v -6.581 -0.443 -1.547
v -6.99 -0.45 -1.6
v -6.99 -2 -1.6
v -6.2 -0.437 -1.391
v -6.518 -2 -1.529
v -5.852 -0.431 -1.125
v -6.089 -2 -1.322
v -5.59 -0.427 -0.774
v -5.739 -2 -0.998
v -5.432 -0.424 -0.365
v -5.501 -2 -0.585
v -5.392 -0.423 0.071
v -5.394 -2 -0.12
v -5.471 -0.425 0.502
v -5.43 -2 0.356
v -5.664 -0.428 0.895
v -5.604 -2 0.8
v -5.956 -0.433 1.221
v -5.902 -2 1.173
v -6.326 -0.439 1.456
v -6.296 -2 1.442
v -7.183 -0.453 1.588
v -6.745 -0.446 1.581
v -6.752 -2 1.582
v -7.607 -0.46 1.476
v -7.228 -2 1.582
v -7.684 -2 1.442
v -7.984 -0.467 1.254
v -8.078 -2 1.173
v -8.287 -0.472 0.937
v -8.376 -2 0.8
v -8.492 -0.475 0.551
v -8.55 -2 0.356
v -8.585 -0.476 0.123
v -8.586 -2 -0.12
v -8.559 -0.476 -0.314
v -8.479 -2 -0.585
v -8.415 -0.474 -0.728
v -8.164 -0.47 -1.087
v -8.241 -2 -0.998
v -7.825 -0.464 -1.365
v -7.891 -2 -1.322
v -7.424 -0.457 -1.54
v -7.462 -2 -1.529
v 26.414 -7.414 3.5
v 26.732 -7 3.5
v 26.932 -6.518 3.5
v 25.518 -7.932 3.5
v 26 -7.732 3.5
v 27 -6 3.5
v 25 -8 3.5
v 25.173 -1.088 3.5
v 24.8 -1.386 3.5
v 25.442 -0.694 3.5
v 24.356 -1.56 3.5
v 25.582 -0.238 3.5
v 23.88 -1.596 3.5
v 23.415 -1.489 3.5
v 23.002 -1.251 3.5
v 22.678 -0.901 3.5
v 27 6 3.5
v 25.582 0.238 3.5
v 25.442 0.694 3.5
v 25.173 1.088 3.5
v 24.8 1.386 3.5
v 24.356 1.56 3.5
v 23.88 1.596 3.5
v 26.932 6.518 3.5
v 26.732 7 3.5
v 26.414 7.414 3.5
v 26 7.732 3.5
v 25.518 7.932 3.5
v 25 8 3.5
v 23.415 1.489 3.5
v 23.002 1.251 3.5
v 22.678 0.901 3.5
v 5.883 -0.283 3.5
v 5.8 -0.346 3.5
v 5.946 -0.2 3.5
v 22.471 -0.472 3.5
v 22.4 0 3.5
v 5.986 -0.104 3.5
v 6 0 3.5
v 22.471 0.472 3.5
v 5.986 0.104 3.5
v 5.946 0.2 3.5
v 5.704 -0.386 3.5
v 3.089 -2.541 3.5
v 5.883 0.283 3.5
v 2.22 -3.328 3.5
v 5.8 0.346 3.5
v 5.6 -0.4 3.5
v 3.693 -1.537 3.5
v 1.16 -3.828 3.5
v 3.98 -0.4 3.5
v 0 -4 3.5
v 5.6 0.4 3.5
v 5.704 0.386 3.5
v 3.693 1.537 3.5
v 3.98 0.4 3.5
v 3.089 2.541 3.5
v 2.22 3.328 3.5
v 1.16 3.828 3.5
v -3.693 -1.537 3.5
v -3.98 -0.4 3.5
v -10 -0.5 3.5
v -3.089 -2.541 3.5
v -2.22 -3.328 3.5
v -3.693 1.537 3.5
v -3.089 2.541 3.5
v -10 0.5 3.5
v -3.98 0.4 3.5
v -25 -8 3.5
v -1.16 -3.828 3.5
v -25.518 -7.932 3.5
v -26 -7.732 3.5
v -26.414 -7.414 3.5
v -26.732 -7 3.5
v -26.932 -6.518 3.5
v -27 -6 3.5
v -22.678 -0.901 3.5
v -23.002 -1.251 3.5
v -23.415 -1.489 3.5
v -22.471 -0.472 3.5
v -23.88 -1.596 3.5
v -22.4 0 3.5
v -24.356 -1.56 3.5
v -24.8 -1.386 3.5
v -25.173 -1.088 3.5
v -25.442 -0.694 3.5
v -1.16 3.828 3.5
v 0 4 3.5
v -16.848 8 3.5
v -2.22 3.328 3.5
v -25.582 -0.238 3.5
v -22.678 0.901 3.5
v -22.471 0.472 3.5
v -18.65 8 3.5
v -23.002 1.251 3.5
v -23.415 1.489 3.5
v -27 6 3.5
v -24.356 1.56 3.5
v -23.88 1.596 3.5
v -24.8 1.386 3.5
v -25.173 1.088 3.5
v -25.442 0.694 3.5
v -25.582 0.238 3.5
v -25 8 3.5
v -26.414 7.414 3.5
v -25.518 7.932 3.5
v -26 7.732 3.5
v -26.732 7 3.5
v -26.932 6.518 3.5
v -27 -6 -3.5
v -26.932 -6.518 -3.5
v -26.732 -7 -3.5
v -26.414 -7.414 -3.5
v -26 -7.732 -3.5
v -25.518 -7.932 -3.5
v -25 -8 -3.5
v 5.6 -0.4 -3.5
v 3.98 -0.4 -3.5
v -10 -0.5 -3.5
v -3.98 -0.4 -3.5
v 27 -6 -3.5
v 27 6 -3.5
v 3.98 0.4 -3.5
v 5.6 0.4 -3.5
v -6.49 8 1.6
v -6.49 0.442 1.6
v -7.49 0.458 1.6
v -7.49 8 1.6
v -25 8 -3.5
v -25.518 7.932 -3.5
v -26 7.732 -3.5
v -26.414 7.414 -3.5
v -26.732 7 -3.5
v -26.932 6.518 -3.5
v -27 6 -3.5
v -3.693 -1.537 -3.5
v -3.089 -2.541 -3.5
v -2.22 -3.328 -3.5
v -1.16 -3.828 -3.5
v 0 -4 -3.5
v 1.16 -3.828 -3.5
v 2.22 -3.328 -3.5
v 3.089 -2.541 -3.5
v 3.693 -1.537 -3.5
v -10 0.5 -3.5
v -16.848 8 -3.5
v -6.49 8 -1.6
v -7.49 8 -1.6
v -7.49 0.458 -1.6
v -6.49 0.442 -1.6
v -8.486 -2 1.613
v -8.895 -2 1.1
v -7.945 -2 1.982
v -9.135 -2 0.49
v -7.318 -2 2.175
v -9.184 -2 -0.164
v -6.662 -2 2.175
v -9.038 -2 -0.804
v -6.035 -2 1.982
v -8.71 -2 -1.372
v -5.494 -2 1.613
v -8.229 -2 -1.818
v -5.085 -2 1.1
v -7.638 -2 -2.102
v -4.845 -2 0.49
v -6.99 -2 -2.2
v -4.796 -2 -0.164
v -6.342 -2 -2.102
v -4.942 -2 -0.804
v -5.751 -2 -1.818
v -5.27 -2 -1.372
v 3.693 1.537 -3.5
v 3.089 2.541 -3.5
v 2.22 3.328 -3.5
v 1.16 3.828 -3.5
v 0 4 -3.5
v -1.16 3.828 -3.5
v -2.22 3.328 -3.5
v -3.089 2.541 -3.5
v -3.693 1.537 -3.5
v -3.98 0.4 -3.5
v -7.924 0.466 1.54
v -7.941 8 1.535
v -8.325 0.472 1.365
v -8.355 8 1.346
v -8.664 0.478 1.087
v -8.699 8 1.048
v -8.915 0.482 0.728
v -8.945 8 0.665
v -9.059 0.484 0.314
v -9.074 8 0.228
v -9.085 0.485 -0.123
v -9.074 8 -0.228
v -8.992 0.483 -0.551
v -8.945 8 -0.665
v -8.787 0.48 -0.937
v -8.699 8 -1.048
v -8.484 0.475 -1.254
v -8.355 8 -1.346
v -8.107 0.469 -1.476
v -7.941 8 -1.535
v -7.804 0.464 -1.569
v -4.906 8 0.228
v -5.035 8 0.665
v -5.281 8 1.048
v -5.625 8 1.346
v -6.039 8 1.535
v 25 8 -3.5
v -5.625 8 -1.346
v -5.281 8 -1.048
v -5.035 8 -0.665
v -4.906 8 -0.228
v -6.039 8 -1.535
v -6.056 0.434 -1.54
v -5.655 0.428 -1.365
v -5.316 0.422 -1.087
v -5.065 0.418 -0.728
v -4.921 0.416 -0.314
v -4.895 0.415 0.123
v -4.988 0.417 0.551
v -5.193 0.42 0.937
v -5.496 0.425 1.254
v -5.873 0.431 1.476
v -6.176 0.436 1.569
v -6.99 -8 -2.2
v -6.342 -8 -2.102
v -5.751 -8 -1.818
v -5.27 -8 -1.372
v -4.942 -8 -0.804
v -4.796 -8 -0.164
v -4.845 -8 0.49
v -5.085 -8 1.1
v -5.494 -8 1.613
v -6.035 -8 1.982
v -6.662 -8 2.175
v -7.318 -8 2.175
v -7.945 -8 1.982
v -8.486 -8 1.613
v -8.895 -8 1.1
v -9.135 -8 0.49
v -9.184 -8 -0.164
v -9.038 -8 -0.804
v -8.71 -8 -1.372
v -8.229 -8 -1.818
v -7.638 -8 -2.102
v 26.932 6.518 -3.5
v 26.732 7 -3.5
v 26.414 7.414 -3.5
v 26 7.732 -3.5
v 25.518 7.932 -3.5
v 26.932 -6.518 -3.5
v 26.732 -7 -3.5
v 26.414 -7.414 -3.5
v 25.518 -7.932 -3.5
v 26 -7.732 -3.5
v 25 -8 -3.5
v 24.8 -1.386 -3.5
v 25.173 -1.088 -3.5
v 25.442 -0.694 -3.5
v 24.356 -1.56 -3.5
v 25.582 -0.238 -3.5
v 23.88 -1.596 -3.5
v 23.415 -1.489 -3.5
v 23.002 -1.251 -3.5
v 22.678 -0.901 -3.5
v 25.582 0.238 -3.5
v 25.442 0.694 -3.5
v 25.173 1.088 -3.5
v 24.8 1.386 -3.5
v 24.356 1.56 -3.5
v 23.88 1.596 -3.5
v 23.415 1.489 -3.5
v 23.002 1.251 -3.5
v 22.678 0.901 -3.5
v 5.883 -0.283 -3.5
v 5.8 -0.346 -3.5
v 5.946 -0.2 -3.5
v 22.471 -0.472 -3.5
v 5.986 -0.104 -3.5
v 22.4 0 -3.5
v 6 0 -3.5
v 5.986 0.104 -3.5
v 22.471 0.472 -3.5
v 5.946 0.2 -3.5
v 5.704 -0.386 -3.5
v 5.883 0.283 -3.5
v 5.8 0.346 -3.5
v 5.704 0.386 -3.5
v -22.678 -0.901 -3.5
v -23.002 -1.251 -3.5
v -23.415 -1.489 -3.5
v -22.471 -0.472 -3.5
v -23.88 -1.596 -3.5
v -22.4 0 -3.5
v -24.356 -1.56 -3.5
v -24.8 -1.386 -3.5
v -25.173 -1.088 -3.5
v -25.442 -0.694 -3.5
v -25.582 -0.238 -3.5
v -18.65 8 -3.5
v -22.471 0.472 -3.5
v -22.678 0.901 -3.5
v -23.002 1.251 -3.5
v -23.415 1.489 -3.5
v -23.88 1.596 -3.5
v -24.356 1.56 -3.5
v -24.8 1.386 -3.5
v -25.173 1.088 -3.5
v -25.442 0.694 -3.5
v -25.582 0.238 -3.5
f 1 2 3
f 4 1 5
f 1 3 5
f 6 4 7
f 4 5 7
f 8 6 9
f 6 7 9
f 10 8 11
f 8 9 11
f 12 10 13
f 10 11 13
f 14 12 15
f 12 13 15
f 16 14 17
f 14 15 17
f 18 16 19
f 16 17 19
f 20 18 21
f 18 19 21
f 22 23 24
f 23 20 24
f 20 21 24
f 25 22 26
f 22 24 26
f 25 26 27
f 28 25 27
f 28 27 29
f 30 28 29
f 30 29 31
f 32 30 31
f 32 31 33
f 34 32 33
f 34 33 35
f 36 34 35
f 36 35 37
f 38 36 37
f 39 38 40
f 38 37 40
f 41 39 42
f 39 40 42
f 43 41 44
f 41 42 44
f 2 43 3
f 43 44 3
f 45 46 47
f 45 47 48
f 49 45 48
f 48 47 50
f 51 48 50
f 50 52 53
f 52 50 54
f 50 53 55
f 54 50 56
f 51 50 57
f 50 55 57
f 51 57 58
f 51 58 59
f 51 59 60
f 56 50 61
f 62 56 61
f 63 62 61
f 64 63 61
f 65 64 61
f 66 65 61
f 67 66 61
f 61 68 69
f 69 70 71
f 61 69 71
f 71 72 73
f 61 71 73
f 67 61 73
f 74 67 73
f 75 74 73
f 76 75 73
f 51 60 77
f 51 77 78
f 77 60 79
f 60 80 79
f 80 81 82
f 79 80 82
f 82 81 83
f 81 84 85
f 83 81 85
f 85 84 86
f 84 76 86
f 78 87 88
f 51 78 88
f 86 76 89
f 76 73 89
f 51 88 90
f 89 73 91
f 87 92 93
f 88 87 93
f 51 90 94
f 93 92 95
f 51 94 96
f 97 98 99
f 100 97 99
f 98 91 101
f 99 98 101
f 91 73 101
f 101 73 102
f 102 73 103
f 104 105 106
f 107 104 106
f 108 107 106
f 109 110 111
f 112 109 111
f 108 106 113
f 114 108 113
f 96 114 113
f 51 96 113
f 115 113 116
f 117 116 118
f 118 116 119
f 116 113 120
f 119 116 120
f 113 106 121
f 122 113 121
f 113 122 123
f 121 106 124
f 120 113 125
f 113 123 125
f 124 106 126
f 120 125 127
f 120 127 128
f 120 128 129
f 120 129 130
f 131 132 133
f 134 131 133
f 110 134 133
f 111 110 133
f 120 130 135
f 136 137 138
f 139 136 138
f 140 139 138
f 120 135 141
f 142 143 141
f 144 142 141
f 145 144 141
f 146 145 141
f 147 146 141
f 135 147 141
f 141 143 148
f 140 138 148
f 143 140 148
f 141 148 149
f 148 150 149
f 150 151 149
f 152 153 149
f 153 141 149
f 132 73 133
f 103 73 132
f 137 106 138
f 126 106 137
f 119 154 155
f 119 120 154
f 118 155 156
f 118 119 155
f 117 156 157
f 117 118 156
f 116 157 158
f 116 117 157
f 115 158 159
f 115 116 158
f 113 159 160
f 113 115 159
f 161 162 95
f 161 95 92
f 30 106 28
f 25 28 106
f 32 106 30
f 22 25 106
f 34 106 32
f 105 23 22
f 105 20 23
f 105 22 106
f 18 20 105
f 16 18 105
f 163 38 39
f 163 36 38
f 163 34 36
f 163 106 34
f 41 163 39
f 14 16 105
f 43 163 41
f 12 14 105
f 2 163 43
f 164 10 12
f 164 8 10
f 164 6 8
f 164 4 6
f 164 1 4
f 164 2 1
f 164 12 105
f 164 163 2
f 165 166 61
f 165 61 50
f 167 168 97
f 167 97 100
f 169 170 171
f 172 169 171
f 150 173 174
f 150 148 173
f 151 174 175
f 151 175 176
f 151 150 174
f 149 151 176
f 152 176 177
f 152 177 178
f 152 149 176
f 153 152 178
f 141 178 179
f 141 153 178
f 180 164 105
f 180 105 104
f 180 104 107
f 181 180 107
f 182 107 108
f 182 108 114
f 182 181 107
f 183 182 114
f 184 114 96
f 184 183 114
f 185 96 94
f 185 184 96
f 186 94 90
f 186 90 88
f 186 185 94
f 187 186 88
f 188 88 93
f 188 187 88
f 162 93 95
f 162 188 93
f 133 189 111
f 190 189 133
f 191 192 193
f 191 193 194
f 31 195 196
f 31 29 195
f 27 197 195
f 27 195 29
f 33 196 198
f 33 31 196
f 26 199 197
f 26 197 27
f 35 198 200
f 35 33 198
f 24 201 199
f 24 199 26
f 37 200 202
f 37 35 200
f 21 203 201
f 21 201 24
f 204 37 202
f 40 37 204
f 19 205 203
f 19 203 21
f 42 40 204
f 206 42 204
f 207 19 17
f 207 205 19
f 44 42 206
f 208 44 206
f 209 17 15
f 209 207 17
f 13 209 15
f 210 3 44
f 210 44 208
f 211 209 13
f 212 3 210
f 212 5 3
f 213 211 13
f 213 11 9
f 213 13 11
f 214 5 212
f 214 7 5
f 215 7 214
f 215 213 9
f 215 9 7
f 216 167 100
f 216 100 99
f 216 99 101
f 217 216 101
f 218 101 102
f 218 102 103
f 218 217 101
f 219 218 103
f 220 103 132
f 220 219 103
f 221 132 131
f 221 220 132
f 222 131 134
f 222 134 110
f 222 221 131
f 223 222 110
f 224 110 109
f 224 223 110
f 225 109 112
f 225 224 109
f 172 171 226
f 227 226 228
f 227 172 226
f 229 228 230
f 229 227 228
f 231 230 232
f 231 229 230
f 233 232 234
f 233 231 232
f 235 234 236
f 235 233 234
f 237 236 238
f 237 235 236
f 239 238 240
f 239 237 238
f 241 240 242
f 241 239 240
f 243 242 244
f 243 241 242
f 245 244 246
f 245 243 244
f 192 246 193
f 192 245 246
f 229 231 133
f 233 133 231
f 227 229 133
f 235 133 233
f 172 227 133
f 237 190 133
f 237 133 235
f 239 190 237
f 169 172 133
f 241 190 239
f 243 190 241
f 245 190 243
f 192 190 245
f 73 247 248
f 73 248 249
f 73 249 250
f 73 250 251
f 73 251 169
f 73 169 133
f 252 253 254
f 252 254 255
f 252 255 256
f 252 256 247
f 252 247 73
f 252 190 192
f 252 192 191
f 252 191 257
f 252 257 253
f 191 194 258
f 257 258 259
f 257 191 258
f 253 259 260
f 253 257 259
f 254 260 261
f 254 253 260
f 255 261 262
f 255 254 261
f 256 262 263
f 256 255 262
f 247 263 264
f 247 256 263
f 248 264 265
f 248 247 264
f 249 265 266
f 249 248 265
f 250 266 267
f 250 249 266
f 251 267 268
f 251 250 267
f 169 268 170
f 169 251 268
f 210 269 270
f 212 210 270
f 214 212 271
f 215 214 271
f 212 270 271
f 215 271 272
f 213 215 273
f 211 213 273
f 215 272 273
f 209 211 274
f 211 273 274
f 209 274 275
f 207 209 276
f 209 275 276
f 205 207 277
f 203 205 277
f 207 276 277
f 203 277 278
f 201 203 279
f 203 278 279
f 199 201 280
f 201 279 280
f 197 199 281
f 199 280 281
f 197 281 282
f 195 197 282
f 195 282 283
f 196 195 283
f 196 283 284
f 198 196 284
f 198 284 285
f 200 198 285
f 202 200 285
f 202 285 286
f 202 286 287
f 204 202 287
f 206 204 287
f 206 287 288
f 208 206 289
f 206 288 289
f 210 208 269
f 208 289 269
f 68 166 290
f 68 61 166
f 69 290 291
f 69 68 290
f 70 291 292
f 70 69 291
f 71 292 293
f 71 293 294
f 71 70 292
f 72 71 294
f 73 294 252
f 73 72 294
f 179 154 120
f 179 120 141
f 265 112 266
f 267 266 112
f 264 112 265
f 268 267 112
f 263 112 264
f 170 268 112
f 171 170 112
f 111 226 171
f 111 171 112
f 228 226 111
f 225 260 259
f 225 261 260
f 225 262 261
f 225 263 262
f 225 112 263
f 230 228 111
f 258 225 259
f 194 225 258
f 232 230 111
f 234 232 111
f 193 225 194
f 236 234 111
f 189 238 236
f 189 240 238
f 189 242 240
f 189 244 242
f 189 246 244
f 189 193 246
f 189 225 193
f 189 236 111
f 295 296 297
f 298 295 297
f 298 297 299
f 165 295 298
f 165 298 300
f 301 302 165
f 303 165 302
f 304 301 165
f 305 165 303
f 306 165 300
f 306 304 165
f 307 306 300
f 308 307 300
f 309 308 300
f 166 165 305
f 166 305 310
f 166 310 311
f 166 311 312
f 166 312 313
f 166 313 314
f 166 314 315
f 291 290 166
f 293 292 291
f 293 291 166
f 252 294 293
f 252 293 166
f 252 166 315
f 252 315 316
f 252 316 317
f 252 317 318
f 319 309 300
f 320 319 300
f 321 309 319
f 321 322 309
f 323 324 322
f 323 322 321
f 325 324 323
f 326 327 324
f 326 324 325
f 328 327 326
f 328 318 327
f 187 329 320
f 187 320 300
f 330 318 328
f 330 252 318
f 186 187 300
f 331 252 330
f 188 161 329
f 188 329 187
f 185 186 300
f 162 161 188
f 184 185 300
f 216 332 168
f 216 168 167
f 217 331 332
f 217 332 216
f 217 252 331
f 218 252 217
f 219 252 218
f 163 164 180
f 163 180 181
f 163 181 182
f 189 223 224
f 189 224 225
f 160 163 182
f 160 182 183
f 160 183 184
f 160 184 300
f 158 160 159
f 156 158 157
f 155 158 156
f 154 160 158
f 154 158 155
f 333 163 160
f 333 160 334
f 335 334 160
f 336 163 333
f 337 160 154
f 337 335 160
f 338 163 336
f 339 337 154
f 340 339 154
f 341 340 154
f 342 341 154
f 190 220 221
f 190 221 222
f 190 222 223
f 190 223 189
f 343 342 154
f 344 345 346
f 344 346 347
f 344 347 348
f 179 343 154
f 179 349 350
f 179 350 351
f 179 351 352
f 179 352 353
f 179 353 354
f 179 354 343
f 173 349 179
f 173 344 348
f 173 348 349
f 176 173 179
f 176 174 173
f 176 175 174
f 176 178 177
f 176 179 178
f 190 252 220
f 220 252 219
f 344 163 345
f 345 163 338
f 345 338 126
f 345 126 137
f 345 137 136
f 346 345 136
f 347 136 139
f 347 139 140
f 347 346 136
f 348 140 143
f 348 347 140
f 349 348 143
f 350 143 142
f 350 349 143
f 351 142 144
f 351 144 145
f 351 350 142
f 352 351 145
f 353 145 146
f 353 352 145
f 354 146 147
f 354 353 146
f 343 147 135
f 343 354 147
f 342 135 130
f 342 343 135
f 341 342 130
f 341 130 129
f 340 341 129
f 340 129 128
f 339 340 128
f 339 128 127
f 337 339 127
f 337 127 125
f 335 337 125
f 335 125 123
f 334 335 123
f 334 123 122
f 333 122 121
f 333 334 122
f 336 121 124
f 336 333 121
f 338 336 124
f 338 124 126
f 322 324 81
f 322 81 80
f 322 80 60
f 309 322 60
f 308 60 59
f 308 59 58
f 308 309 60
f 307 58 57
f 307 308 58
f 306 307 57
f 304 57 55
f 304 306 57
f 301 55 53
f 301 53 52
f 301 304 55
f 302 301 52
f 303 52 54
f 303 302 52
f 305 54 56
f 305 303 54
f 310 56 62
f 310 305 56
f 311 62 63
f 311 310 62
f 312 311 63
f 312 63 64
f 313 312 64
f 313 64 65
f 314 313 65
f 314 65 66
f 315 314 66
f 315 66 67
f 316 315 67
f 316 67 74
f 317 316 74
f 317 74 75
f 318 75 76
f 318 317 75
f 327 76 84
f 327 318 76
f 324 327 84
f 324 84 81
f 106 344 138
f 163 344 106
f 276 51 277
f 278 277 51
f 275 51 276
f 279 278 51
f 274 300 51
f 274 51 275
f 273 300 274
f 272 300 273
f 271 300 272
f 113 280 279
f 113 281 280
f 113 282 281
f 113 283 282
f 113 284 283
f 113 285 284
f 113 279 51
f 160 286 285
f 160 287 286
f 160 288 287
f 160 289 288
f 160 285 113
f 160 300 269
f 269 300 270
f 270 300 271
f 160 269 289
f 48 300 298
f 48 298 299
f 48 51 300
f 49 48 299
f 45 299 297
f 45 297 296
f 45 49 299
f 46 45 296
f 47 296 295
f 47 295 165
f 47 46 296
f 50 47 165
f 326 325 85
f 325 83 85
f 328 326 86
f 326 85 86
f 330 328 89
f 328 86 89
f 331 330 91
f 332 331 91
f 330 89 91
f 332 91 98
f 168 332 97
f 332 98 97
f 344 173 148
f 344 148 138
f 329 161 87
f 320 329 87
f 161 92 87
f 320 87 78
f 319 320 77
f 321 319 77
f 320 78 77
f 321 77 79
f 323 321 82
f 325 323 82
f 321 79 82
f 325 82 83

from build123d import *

# Parameters (mm, degrees)
BOSS_EXTRUDE1_DEPTH      = 3.5
BOSS_EXTRUDE1_DEPTH_BACK = 3.5
SKETCH1_R                = 1.6
CUT_EXTRUDE1_REACH       = 33.579
SKETCH3_R                = 1.6
SKETCH3_3_R              = 2.2
SKETCH3_3_R_2            = 1.6
CUT_EXTRUDE2_DEPTH       = 6
CUT_EXTRUDE3_REACH       = 33.579
FILLET1_R                = 2
FILLET2_R                = 0.4


with BuildPart() as part:
    # Sketch1 → Boss-Extrude1 (new, two sides: drawn at the far end of the back side and taken through both)
    with BuildSketch(Plane.XY.offset(-BOSS_EXTRUDE1_DEPTH_BACK)):
        with BuildLine():
            Line((-27, 8), (-18.64966284, 8))
            Line((-18.64966284, 8), (-10, -0.5))
            Line((-10, -0.5), (-3.979949748, -0.4))
            ThreePointArc((-3.979949748, -0.4), (0, -4), (3.979949748, -0.4))
            Line((3.979949748, -0.4), (6, -0.4))
            Line((6, -0.4), (6, 0.4))
            Line((6, 0.4), (3.979949748, 0.4))
            ThreePointArc((3.979949748, 0.4), (0, 4), (-3.979949748, 0.4))
            Line((-3.979949748, 0.4), (-10, 0.5))
            Line((-10, 0.5), (-16.848441102, 8))
            Line((-16.848441102, 8), (27, 8))
            Line((27, 8), (27, -8))
            Line((27, -8), (-27, -8))
            Line((-27, -8), (-27, 8))
        make_face()
        with Locations((-24, 0)):
            Circle(SKETCH1_R, mode=Mode.SUBTRACT)
        with Locations(Location((24, 0, 0), (0, 0, 180))):
            Circle(SKETCH1_R, mode=Mode.SUBTRACT)
    extrude(amount=BOSS_EXTRUDE1_DEPTH + BOSS_EXTRUDE1_DEPTH_BACK)

    # Cut-Extrude1: up to this plane
    cut_extrude1_end = Plane(origin=(-10, -0.5, -3.5), z_dir=(-0.016608865731892127, 0.9998620632762801, 0))
    # Sketch3 → Cut-Extrude1 (cut, up to the surface)
    with BuildSketch(Plane.XZ.offset(8), mode=Mode.PRIVATE) as cut_extrude1_sk1:
        with Locations(Location((-6.989974874, 0, 0), (0, 0, 270))):
            Circle(SKETCH3_R)
    cut_extrude1_tool1 = split(extrude(cut_extrude1_sk1.sketch, amount=-CUT_EXTRUDE1_REACH, mode=Mode.PRIVATE), bisect_by=cut_extrude1_end, keep=Keep.BOTH, mode=Mode.PRIVATE)
    add(cut_extrude1_tool1.solids().sort_by_distance((-6.989975, -8, 0))[0], mode=Mode.SUBTRACT)

    # Sketch3<3> → Cut-Extrude2 (cut)
    with BuildSketch(Plane.XZ.offset(8)):
        with Locations(Location((-6.989974874, 0, 0), (0, 0, 270))):
            Circle(SKETCH3_3_R)
        with Locations(Location((-6.989974874, 0, 0), (0, 0, 270))):
            Circle(SKETCH3_3_R_2, mode=Mode.SUBTRACT)
    extrude(amount=-CUT_EXTRUDE2_DEPTH, mode=Mode.SUBTRACT)

    # Cut-Extrude3: up to this plane
    cut_extrude3_end = Plane(origin=(-10, 0.5, -3.5), z_dir=(-0.016608865731892127, -0.9998620632762801, 0))
    # Sketch4 → Cut-Extrude3 (cut, up to the surface)
    with BuildSketch(Plane(origin=(0, 8, 0), x_dir=(1, 0, 0), z_dir=(0, 1, 0)), mode=Mode.PRIVATE) as cut_extrude3_sk1:
        with BuildLine():
            Line((-7.489974874, 1.6), (-6.489974874, 1.6))
            ThreePointArc((-6.489974874, 1.6), (-4.889974874, 0), (-6.489974874, -1.6))
            Line((-6.489974874, -1.6), (-7.489974874, -1.6))
            ThreePointArc((-7.489974874, -1.6), (-9.089974874, 0), (-7.489974874, 1.6))
        make_face()
    cut_extrude3_tool1 = split(extrude(cut_extrude3_sk1.sketch, amount=-CUT_EXTRUDE3_REACH, mode=Mode.PRIVATE), bisect_by=cut_extrude3_end, keep=Keep.BOTH, mode=Mode.PRIVATE)
    add(cut_extrude3_tool1.solids().sort_by_distance((-6.989975, 8, 0))[0], mode=Mode.SUBTRACT)

    # Fillet1
    fillet1_edges = [part.edges().sort_by_distance(p)[0] for p in [
        (27, 8, 0),
        (27, -8, 0),
        (-27, -8, 0),
        (-27, 8, 0),
    ]]
    fillet(fillet1_edges, radius=FILLET1_R)

    # Fillet2
    fillet2_edges = [part.edges().sort_by_distance(p)[0] for p in [
        (6, -0.4, 0),
        (6, 0.4, 0),
    ]]
    fillet(fillet2_edges, radius=FILLET2_R - 0.0001)  # a hair under: the kernel refuses the full size


solid = part.part
